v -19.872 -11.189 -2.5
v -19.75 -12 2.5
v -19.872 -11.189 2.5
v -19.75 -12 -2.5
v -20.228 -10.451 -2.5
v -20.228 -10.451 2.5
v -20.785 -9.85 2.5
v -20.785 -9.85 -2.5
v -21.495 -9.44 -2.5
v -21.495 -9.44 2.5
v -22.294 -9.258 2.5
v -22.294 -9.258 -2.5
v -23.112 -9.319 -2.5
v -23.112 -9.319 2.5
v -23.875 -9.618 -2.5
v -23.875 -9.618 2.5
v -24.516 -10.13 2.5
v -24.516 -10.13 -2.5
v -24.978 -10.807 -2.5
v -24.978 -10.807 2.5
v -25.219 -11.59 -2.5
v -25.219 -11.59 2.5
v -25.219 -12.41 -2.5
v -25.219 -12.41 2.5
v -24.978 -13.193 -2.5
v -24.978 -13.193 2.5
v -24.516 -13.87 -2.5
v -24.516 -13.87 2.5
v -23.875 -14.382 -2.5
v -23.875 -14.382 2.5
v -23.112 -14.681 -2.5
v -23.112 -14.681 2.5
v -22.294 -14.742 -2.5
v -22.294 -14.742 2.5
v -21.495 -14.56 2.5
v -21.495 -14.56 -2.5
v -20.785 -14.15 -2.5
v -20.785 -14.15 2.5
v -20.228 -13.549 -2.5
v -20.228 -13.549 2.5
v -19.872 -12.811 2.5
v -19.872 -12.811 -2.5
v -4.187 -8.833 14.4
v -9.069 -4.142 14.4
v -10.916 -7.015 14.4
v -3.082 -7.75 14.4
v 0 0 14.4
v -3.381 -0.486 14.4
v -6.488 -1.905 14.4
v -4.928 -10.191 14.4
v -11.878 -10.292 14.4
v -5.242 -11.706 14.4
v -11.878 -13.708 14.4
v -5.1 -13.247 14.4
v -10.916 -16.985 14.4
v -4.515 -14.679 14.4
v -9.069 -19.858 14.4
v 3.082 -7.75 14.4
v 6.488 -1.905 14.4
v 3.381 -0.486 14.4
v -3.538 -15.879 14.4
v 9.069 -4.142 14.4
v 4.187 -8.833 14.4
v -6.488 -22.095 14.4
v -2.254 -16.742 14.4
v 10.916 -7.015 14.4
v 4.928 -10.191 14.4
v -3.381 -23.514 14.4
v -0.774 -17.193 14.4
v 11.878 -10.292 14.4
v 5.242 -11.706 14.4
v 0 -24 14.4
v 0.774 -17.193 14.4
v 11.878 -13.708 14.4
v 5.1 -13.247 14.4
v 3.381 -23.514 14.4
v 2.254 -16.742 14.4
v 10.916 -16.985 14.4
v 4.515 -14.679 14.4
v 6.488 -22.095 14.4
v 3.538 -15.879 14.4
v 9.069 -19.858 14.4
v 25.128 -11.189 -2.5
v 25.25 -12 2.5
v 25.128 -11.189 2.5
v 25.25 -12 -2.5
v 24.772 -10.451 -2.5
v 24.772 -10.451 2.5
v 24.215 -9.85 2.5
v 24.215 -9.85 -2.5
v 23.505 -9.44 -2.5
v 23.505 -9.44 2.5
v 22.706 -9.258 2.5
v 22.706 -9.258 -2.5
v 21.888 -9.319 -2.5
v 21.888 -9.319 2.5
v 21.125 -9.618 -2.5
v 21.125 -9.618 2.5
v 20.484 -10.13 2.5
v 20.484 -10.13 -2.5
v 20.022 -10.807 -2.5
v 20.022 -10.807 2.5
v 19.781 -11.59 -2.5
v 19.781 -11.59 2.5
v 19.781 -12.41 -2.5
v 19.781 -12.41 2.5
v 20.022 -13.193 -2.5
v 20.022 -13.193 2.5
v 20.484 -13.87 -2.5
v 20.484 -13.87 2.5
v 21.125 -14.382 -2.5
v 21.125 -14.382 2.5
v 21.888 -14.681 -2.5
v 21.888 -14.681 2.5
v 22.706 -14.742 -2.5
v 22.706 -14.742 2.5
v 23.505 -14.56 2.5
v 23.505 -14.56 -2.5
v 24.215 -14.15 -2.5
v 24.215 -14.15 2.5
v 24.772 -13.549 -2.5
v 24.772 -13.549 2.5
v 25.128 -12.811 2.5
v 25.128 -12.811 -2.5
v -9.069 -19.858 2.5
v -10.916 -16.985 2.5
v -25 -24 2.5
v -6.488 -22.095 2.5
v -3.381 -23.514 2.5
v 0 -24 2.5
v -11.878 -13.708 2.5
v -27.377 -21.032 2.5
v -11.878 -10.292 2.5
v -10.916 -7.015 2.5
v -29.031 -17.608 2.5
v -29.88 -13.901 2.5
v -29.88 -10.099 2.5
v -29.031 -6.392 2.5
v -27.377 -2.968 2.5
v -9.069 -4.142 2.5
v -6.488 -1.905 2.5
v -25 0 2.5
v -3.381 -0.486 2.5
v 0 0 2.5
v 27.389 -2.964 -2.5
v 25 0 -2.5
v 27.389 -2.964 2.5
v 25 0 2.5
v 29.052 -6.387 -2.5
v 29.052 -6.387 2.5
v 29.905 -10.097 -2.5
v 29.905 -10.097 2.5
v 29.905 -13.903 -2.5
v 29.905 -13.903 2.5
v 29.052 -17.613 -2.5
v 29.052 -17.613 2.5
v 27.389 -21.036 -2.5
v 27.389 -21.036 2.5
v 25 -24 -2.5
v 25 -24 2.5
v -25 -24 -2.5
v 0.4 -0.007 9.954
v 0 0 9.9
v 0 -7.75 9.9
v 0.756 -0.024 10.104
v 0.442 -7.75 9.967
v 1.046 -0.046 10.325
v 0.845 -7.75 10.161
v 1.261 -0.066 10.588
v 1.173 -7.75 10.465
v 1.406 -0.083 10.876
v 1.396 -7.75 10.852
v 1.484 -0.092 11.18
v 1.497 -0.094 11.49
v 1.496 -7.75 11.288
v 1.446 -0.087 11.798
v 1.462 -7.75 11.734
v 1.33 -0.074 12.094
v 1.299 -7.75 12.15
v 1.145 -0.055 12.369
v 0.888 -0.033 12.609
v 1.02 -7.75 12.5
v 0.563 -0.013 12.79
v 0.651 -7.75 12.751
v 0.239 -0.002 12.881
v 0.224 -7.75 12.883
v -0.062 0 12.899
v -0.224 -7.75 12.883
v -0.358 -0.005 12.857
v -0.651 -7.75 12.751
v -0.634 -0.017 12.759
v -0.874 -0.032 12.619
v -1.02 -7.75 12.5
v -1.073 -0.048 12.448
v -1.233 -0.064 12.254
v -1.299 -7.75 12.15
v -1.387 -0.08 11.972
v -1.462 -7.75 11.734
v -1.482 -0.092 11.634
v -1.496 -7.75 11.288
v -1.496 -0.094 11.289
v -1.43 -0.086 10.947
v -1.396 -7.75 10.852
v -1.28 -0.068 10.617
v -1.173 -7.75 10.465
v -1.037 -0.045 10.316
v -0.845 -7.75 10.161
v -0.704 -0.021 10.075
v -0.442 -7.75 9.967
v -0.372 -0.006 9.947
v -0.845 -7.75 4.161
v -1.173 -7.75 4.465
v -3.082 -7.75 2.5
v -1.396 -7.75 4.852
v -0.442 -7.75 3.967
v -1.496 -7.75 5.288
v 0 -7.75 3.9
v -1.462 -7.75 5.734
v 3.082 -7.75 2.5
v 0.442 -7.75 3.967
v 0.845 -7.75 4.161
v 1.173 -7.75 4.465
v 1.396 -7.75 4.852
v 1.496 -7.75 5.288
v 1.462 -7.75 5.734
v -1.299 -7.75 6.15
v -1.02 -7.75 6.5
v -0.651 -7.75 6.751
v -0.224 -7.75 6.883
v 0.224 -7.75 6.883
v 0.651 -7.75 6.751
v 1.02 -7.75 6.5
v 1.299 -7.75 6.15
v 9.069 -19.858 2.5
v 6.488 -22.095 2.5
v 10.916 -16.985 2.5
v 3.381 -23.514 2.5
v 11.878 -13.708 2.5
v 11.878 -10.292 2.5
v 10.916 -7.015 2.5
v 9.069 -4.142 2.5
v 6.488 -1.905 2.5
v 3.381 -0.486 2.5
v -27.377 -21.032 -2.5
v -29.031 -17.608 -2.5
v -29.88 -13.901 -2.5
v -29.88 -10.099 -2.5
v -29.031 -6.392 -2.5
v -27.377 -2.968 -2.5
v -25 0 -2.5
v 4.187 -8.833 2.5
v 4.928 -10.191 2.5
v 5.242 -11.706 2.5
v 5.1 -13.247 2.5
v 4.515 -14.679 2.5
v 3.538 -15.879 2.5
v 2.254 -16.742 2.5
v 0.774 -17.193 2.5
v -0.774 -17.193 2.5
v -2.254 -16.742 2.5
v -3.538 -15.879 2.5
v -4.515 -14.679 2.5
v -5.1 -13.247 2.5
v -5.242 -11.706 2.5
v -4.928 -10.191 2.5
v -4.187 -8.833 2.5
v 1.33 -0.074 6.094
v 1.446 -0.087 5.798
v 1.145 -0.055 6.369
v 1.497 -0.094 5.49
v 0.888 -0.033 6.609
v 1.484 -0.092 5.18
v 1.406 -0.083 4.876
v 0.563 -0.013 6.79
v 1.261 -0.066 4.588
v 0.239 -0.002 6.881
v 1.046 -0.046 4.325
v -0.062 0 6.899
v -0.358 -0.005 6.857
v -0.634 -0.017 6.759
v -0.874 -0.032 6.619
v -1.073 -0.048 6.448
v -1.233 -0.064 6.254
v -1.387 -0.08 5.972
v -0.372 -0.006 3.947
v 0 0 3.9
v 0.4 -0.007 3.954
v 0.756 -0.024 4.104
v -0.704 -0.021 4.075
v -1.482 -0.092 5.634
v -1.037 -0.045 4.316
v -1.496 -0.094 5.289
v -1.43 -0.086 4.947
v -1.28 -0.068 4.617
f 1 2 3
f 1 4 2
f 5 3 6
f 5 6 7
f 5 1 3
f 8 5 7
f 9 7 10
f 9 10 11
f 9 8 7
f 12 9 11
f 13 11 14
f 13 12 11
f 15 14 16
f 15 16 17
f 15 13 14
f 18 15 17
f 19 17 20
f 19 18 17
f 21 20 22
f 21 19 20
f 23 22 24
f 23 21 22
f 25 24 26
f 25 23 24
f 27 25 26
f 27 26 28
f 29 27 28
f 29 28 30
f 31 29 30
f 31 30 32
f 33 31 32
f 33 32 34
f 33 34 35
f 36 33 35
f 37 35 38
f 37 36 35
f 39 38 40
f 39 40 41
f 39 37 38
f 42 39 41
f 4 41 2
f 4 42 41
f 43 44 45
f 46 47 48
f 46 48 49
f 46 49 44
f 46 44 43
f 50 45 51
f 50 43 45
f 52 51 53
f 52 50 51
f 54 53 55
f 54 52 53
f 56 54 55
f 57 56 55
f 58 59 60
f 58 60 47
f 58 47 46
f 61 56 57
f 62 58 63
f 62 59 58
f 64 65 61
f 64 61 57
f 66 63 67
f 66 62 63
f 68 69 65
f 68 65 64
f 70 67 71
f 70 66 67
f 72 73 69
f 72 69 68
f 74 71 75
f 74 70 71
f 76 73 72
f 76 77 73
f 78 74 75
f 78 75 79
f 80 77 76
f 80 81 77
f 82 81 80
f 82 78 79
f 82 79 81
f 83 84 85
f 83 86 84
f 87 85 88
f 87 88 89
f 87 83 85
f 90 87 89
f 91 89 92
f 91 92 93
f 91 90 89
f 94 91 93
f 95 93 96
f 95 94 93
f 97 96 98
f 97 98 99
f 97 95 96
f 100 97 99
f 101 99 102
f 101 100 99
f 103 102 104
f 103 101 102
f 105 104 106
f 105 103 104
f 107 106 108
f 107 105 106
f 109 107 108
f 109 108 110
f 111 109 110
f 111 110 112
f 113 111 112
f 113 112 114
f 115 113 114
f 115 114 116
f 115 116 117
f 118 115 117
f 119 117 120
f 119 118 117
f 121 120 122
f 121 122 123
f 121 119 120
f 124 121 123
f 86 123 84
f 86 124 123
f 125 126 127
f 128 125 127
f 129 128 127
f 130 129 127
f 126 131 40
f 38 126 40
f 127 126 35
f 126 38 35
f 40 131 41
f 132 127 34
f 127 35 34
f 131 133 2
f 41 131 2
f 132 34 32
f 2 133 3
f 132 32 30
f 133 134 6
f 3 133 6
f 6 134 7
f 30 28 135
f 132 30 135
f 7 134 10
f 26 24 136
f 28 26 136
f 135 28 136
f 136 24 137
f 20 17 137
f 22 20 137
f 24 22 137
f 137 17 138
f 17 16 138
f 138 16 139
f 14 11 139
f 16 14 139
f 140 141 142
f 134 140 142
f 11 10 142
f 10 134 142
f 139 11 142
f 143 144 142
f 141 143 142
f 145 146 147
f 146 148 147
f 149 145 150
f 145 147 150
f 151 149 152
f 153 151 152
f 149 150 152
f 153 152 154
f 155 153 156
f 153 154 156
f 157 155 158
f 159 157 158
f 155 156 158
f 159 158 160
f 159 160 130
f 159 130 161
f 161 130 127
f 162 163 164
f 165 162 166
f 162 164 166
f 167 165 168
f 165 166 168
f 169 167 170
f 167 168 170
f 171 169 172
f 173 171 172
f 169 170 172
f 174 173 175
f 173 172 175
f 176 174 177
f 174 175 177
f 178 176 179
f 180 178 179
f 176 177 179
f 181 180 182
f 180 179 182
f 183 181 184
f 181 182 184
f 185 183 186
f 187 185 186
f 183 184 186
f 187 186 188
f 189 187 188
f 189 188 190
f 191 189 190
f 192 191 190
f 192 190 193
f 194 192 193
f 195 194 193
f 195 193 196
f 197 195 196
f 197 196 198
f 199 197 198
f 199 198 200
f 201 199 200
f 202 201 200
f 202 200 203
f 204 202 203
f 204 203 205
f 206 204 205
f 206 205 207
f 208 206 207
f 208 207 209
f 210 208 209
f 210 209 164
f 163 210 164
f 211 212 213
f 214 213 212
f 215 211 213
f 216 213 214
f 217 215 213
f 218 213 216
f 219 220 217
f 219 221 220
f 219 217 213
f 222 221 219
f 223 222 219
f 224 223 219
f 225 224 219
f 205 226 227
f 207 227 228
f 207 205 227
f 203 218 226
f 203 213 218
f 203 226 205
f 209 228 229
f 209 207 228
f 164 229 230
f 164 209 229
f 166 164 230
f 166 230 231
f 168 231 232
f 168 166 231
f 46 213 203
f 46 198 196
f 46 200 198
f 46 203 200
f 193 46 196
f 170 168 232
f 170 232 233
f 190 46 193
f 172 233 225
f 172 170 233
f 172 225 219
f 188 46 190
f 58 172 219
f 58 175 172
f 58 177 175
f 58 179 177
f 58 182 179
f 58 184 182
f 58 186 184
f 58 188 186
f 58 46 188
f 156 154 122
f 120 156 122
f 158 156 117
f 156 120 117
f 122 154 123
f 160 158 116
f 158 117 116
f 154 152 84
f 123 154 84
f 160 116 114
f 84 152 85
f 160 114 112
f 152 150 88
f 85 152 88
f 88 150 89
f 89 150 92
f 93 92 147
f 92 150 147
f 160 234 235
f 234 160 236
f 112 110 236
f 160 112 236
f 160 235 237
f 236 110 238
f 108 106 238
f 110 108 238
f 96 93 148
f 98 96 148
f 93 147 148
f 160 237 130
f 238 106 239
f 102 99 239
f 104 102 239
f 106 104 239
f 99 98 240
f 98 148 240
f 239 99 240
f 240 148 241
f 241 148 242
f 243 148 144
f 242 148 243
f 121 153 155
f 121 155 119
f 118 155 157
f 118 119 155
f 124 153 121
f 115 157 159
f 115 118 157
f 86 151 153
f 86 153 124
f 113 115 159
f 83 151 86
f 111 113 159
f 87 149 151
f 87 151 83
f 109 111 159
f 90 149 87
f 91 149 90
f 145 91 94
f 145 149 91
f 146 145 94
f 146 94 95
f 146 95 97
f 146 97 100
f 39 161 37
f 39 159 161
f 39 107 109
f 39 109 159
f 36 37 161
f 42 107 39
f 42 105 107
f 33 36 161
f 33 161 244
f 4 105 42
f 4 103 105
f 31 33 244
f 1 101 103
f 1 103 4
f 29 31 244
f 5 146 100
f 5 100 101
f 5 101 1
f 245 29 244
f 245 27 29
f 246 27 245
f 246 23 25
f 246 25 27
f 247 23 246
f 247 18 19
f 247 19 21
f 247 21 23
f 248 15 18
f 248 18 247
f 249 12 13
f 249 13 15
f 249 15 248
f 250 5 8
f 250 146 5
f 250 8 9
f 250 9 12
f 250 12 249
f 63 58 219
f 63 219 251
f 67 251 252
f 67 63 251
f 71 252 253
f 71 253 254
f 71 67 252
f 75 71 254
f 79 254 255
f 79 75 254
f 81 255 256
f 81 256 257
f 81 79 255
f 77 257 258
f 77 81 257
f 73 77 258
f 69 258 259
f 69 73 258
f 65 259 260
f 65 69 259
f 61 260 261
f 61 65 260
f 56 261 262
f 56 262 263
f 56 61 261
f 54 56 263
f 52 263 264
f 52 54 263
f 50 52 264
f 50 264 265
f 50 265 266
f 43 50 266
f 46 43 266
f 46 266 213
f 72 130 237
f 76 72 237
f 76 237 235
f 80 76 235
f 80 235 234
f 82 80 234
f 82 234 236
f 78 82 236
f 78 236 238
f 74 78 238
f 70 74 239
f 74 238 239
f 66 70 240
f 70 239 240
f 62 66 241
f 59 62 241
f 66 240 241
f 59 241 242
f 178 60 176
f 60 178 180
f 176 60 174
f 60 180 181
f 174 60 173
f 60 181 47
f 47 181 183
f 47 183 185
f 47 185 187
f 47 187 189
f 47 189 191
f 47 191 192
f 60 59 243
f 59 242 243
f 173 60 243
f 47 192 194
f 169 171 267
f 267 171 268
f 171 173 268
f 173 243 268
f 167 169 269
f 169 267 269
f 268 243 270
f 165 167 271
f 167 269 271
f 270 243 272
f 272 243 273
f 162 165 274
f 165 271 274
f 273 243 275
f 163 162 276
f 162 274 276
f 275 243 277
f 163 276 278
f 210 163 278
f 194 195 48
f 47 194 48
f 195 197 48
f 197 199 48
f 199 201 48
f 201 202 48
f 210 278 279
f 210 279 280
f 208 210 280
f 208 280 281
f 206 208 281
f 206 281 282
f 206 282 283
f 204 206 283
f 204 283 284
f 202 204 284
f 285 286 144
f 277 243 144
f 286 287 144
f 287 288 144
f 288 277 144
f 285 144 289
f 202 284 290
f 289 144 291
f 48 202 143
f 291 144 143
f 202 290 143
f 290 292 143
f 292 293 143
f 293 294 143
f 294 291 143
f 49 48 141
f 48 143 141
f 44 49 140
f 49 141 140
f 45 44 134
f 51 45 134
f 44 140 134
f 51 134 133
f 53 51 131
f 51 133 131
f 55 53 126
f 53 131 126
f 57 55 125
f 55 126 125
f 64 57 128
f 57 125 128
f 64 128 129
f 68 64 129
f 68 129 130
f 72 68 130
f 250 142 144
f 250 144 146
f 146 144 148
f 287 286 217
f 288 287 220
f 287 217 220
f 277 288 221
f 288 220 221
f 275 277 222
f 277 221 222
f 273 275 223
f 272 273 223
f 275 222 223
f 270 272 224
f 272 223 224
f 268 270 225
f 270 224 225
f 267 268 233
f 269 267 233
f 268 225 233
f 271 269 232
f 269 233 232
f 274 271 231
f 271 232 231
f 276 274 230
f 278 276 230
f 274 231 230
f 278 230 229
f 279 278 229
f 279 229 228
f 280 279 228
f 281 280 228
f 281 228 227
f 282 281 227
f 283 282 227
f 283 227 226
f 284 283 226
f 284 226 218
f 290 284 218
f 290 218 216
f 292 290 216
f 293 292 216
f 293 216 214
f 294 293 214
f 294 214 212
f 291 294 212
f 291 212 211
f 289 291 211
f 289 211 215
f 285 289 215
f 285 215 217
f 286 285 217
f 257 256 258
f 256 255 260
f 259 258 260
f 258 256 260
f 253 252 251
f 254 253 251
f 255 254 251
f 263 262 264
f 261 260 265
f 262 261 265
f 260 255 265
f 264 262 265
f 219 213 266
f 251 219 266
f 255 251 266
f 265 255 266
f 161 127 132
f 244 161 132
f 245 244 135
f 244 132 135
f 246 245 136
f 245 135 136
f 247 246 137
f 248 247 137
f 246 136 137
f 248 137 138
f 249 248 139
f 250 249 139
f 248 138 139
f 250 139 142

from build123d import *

# Parameters (mm, degrees)
SKETCH_1_R          = 2.75
EXTRUDE_1_DEPTH     = 2.5
SKETCH_2_R          = 12
EXTRUDE_2_DEPTH     = 11.9
CUT_EXTRUDE_1_DEPTH = 11.9
SKETCH_4_R          = 1.5
CUT_EXTRUDE_2_DEPTH = 38.043126228


with BuildPart() as part:
    # 草图1 → 凸台-拉伸1 (new, symmetric)
    with BuildSketch(Plane.XY):
        with BuildLine():
            Line((-25, 0), (25, 0))
            ThreePointArc((25, 0), (30.012842263, -12), (25, -24))
            Line((25, -24), (-25, -24))
            ThreePointArc((-25, -24), (-29.987157737, -12), (-25, 0))
        make_face()
        with Locations((-22.5, -12)):
            Circle(SKETCH_1_R, mode=Mode.SUBTRACT)
        with Locations((22.5, -12)):
            Circle(SKETCH_1_R, mode=Mode.SUBTRACT)
    extrude(amount=EXTRUDE_1_DEPTH, both=True)

    # 草图2 → 凸台-拉伸2 (add)
    with BuildSketch(Plane.XY.offset(2.5)):
        with Locations(Location((0, -12, 0), (0, 0, 270))):
            Circle(SKETCH_2_R)
    extrude(amount=EXTRUDE_2_DEPTH)

    # 草图3 → 切除-拉伸1 (cut)
    with BuildSketch(Plane.XY.offset(14.4)):
        with BuildLine():
            Line((-3.082207001, -7.75), (3.082207001, -7.75))
            ThreePointArc((3.082207001, -7.75), (0, -17.25), (-3.082207001, -7.75))
        make_face()
    extrude(amount=-CUT_EXTRUDE_1_DEPTH, mode=Mode.SUBTRACT)

    # 草图4 → 切除-拉伸2 (cut, through all)
    with BuildSketch(Plane.XZ.offset(7.75)):
        with Locations(Location((0, 11.4, 0), (0, 0, 270))):
            Circle(SKETCH_4_R)
        with Locations(Location((0, 5.4, 0), (0, 0, 270))):
            Circle(SKETCH_4_R)
    extrude(amount=-CUT_EXTRUDE_2_DEPTH, mode=Mode.SUBTRACT)


solid = part.part
